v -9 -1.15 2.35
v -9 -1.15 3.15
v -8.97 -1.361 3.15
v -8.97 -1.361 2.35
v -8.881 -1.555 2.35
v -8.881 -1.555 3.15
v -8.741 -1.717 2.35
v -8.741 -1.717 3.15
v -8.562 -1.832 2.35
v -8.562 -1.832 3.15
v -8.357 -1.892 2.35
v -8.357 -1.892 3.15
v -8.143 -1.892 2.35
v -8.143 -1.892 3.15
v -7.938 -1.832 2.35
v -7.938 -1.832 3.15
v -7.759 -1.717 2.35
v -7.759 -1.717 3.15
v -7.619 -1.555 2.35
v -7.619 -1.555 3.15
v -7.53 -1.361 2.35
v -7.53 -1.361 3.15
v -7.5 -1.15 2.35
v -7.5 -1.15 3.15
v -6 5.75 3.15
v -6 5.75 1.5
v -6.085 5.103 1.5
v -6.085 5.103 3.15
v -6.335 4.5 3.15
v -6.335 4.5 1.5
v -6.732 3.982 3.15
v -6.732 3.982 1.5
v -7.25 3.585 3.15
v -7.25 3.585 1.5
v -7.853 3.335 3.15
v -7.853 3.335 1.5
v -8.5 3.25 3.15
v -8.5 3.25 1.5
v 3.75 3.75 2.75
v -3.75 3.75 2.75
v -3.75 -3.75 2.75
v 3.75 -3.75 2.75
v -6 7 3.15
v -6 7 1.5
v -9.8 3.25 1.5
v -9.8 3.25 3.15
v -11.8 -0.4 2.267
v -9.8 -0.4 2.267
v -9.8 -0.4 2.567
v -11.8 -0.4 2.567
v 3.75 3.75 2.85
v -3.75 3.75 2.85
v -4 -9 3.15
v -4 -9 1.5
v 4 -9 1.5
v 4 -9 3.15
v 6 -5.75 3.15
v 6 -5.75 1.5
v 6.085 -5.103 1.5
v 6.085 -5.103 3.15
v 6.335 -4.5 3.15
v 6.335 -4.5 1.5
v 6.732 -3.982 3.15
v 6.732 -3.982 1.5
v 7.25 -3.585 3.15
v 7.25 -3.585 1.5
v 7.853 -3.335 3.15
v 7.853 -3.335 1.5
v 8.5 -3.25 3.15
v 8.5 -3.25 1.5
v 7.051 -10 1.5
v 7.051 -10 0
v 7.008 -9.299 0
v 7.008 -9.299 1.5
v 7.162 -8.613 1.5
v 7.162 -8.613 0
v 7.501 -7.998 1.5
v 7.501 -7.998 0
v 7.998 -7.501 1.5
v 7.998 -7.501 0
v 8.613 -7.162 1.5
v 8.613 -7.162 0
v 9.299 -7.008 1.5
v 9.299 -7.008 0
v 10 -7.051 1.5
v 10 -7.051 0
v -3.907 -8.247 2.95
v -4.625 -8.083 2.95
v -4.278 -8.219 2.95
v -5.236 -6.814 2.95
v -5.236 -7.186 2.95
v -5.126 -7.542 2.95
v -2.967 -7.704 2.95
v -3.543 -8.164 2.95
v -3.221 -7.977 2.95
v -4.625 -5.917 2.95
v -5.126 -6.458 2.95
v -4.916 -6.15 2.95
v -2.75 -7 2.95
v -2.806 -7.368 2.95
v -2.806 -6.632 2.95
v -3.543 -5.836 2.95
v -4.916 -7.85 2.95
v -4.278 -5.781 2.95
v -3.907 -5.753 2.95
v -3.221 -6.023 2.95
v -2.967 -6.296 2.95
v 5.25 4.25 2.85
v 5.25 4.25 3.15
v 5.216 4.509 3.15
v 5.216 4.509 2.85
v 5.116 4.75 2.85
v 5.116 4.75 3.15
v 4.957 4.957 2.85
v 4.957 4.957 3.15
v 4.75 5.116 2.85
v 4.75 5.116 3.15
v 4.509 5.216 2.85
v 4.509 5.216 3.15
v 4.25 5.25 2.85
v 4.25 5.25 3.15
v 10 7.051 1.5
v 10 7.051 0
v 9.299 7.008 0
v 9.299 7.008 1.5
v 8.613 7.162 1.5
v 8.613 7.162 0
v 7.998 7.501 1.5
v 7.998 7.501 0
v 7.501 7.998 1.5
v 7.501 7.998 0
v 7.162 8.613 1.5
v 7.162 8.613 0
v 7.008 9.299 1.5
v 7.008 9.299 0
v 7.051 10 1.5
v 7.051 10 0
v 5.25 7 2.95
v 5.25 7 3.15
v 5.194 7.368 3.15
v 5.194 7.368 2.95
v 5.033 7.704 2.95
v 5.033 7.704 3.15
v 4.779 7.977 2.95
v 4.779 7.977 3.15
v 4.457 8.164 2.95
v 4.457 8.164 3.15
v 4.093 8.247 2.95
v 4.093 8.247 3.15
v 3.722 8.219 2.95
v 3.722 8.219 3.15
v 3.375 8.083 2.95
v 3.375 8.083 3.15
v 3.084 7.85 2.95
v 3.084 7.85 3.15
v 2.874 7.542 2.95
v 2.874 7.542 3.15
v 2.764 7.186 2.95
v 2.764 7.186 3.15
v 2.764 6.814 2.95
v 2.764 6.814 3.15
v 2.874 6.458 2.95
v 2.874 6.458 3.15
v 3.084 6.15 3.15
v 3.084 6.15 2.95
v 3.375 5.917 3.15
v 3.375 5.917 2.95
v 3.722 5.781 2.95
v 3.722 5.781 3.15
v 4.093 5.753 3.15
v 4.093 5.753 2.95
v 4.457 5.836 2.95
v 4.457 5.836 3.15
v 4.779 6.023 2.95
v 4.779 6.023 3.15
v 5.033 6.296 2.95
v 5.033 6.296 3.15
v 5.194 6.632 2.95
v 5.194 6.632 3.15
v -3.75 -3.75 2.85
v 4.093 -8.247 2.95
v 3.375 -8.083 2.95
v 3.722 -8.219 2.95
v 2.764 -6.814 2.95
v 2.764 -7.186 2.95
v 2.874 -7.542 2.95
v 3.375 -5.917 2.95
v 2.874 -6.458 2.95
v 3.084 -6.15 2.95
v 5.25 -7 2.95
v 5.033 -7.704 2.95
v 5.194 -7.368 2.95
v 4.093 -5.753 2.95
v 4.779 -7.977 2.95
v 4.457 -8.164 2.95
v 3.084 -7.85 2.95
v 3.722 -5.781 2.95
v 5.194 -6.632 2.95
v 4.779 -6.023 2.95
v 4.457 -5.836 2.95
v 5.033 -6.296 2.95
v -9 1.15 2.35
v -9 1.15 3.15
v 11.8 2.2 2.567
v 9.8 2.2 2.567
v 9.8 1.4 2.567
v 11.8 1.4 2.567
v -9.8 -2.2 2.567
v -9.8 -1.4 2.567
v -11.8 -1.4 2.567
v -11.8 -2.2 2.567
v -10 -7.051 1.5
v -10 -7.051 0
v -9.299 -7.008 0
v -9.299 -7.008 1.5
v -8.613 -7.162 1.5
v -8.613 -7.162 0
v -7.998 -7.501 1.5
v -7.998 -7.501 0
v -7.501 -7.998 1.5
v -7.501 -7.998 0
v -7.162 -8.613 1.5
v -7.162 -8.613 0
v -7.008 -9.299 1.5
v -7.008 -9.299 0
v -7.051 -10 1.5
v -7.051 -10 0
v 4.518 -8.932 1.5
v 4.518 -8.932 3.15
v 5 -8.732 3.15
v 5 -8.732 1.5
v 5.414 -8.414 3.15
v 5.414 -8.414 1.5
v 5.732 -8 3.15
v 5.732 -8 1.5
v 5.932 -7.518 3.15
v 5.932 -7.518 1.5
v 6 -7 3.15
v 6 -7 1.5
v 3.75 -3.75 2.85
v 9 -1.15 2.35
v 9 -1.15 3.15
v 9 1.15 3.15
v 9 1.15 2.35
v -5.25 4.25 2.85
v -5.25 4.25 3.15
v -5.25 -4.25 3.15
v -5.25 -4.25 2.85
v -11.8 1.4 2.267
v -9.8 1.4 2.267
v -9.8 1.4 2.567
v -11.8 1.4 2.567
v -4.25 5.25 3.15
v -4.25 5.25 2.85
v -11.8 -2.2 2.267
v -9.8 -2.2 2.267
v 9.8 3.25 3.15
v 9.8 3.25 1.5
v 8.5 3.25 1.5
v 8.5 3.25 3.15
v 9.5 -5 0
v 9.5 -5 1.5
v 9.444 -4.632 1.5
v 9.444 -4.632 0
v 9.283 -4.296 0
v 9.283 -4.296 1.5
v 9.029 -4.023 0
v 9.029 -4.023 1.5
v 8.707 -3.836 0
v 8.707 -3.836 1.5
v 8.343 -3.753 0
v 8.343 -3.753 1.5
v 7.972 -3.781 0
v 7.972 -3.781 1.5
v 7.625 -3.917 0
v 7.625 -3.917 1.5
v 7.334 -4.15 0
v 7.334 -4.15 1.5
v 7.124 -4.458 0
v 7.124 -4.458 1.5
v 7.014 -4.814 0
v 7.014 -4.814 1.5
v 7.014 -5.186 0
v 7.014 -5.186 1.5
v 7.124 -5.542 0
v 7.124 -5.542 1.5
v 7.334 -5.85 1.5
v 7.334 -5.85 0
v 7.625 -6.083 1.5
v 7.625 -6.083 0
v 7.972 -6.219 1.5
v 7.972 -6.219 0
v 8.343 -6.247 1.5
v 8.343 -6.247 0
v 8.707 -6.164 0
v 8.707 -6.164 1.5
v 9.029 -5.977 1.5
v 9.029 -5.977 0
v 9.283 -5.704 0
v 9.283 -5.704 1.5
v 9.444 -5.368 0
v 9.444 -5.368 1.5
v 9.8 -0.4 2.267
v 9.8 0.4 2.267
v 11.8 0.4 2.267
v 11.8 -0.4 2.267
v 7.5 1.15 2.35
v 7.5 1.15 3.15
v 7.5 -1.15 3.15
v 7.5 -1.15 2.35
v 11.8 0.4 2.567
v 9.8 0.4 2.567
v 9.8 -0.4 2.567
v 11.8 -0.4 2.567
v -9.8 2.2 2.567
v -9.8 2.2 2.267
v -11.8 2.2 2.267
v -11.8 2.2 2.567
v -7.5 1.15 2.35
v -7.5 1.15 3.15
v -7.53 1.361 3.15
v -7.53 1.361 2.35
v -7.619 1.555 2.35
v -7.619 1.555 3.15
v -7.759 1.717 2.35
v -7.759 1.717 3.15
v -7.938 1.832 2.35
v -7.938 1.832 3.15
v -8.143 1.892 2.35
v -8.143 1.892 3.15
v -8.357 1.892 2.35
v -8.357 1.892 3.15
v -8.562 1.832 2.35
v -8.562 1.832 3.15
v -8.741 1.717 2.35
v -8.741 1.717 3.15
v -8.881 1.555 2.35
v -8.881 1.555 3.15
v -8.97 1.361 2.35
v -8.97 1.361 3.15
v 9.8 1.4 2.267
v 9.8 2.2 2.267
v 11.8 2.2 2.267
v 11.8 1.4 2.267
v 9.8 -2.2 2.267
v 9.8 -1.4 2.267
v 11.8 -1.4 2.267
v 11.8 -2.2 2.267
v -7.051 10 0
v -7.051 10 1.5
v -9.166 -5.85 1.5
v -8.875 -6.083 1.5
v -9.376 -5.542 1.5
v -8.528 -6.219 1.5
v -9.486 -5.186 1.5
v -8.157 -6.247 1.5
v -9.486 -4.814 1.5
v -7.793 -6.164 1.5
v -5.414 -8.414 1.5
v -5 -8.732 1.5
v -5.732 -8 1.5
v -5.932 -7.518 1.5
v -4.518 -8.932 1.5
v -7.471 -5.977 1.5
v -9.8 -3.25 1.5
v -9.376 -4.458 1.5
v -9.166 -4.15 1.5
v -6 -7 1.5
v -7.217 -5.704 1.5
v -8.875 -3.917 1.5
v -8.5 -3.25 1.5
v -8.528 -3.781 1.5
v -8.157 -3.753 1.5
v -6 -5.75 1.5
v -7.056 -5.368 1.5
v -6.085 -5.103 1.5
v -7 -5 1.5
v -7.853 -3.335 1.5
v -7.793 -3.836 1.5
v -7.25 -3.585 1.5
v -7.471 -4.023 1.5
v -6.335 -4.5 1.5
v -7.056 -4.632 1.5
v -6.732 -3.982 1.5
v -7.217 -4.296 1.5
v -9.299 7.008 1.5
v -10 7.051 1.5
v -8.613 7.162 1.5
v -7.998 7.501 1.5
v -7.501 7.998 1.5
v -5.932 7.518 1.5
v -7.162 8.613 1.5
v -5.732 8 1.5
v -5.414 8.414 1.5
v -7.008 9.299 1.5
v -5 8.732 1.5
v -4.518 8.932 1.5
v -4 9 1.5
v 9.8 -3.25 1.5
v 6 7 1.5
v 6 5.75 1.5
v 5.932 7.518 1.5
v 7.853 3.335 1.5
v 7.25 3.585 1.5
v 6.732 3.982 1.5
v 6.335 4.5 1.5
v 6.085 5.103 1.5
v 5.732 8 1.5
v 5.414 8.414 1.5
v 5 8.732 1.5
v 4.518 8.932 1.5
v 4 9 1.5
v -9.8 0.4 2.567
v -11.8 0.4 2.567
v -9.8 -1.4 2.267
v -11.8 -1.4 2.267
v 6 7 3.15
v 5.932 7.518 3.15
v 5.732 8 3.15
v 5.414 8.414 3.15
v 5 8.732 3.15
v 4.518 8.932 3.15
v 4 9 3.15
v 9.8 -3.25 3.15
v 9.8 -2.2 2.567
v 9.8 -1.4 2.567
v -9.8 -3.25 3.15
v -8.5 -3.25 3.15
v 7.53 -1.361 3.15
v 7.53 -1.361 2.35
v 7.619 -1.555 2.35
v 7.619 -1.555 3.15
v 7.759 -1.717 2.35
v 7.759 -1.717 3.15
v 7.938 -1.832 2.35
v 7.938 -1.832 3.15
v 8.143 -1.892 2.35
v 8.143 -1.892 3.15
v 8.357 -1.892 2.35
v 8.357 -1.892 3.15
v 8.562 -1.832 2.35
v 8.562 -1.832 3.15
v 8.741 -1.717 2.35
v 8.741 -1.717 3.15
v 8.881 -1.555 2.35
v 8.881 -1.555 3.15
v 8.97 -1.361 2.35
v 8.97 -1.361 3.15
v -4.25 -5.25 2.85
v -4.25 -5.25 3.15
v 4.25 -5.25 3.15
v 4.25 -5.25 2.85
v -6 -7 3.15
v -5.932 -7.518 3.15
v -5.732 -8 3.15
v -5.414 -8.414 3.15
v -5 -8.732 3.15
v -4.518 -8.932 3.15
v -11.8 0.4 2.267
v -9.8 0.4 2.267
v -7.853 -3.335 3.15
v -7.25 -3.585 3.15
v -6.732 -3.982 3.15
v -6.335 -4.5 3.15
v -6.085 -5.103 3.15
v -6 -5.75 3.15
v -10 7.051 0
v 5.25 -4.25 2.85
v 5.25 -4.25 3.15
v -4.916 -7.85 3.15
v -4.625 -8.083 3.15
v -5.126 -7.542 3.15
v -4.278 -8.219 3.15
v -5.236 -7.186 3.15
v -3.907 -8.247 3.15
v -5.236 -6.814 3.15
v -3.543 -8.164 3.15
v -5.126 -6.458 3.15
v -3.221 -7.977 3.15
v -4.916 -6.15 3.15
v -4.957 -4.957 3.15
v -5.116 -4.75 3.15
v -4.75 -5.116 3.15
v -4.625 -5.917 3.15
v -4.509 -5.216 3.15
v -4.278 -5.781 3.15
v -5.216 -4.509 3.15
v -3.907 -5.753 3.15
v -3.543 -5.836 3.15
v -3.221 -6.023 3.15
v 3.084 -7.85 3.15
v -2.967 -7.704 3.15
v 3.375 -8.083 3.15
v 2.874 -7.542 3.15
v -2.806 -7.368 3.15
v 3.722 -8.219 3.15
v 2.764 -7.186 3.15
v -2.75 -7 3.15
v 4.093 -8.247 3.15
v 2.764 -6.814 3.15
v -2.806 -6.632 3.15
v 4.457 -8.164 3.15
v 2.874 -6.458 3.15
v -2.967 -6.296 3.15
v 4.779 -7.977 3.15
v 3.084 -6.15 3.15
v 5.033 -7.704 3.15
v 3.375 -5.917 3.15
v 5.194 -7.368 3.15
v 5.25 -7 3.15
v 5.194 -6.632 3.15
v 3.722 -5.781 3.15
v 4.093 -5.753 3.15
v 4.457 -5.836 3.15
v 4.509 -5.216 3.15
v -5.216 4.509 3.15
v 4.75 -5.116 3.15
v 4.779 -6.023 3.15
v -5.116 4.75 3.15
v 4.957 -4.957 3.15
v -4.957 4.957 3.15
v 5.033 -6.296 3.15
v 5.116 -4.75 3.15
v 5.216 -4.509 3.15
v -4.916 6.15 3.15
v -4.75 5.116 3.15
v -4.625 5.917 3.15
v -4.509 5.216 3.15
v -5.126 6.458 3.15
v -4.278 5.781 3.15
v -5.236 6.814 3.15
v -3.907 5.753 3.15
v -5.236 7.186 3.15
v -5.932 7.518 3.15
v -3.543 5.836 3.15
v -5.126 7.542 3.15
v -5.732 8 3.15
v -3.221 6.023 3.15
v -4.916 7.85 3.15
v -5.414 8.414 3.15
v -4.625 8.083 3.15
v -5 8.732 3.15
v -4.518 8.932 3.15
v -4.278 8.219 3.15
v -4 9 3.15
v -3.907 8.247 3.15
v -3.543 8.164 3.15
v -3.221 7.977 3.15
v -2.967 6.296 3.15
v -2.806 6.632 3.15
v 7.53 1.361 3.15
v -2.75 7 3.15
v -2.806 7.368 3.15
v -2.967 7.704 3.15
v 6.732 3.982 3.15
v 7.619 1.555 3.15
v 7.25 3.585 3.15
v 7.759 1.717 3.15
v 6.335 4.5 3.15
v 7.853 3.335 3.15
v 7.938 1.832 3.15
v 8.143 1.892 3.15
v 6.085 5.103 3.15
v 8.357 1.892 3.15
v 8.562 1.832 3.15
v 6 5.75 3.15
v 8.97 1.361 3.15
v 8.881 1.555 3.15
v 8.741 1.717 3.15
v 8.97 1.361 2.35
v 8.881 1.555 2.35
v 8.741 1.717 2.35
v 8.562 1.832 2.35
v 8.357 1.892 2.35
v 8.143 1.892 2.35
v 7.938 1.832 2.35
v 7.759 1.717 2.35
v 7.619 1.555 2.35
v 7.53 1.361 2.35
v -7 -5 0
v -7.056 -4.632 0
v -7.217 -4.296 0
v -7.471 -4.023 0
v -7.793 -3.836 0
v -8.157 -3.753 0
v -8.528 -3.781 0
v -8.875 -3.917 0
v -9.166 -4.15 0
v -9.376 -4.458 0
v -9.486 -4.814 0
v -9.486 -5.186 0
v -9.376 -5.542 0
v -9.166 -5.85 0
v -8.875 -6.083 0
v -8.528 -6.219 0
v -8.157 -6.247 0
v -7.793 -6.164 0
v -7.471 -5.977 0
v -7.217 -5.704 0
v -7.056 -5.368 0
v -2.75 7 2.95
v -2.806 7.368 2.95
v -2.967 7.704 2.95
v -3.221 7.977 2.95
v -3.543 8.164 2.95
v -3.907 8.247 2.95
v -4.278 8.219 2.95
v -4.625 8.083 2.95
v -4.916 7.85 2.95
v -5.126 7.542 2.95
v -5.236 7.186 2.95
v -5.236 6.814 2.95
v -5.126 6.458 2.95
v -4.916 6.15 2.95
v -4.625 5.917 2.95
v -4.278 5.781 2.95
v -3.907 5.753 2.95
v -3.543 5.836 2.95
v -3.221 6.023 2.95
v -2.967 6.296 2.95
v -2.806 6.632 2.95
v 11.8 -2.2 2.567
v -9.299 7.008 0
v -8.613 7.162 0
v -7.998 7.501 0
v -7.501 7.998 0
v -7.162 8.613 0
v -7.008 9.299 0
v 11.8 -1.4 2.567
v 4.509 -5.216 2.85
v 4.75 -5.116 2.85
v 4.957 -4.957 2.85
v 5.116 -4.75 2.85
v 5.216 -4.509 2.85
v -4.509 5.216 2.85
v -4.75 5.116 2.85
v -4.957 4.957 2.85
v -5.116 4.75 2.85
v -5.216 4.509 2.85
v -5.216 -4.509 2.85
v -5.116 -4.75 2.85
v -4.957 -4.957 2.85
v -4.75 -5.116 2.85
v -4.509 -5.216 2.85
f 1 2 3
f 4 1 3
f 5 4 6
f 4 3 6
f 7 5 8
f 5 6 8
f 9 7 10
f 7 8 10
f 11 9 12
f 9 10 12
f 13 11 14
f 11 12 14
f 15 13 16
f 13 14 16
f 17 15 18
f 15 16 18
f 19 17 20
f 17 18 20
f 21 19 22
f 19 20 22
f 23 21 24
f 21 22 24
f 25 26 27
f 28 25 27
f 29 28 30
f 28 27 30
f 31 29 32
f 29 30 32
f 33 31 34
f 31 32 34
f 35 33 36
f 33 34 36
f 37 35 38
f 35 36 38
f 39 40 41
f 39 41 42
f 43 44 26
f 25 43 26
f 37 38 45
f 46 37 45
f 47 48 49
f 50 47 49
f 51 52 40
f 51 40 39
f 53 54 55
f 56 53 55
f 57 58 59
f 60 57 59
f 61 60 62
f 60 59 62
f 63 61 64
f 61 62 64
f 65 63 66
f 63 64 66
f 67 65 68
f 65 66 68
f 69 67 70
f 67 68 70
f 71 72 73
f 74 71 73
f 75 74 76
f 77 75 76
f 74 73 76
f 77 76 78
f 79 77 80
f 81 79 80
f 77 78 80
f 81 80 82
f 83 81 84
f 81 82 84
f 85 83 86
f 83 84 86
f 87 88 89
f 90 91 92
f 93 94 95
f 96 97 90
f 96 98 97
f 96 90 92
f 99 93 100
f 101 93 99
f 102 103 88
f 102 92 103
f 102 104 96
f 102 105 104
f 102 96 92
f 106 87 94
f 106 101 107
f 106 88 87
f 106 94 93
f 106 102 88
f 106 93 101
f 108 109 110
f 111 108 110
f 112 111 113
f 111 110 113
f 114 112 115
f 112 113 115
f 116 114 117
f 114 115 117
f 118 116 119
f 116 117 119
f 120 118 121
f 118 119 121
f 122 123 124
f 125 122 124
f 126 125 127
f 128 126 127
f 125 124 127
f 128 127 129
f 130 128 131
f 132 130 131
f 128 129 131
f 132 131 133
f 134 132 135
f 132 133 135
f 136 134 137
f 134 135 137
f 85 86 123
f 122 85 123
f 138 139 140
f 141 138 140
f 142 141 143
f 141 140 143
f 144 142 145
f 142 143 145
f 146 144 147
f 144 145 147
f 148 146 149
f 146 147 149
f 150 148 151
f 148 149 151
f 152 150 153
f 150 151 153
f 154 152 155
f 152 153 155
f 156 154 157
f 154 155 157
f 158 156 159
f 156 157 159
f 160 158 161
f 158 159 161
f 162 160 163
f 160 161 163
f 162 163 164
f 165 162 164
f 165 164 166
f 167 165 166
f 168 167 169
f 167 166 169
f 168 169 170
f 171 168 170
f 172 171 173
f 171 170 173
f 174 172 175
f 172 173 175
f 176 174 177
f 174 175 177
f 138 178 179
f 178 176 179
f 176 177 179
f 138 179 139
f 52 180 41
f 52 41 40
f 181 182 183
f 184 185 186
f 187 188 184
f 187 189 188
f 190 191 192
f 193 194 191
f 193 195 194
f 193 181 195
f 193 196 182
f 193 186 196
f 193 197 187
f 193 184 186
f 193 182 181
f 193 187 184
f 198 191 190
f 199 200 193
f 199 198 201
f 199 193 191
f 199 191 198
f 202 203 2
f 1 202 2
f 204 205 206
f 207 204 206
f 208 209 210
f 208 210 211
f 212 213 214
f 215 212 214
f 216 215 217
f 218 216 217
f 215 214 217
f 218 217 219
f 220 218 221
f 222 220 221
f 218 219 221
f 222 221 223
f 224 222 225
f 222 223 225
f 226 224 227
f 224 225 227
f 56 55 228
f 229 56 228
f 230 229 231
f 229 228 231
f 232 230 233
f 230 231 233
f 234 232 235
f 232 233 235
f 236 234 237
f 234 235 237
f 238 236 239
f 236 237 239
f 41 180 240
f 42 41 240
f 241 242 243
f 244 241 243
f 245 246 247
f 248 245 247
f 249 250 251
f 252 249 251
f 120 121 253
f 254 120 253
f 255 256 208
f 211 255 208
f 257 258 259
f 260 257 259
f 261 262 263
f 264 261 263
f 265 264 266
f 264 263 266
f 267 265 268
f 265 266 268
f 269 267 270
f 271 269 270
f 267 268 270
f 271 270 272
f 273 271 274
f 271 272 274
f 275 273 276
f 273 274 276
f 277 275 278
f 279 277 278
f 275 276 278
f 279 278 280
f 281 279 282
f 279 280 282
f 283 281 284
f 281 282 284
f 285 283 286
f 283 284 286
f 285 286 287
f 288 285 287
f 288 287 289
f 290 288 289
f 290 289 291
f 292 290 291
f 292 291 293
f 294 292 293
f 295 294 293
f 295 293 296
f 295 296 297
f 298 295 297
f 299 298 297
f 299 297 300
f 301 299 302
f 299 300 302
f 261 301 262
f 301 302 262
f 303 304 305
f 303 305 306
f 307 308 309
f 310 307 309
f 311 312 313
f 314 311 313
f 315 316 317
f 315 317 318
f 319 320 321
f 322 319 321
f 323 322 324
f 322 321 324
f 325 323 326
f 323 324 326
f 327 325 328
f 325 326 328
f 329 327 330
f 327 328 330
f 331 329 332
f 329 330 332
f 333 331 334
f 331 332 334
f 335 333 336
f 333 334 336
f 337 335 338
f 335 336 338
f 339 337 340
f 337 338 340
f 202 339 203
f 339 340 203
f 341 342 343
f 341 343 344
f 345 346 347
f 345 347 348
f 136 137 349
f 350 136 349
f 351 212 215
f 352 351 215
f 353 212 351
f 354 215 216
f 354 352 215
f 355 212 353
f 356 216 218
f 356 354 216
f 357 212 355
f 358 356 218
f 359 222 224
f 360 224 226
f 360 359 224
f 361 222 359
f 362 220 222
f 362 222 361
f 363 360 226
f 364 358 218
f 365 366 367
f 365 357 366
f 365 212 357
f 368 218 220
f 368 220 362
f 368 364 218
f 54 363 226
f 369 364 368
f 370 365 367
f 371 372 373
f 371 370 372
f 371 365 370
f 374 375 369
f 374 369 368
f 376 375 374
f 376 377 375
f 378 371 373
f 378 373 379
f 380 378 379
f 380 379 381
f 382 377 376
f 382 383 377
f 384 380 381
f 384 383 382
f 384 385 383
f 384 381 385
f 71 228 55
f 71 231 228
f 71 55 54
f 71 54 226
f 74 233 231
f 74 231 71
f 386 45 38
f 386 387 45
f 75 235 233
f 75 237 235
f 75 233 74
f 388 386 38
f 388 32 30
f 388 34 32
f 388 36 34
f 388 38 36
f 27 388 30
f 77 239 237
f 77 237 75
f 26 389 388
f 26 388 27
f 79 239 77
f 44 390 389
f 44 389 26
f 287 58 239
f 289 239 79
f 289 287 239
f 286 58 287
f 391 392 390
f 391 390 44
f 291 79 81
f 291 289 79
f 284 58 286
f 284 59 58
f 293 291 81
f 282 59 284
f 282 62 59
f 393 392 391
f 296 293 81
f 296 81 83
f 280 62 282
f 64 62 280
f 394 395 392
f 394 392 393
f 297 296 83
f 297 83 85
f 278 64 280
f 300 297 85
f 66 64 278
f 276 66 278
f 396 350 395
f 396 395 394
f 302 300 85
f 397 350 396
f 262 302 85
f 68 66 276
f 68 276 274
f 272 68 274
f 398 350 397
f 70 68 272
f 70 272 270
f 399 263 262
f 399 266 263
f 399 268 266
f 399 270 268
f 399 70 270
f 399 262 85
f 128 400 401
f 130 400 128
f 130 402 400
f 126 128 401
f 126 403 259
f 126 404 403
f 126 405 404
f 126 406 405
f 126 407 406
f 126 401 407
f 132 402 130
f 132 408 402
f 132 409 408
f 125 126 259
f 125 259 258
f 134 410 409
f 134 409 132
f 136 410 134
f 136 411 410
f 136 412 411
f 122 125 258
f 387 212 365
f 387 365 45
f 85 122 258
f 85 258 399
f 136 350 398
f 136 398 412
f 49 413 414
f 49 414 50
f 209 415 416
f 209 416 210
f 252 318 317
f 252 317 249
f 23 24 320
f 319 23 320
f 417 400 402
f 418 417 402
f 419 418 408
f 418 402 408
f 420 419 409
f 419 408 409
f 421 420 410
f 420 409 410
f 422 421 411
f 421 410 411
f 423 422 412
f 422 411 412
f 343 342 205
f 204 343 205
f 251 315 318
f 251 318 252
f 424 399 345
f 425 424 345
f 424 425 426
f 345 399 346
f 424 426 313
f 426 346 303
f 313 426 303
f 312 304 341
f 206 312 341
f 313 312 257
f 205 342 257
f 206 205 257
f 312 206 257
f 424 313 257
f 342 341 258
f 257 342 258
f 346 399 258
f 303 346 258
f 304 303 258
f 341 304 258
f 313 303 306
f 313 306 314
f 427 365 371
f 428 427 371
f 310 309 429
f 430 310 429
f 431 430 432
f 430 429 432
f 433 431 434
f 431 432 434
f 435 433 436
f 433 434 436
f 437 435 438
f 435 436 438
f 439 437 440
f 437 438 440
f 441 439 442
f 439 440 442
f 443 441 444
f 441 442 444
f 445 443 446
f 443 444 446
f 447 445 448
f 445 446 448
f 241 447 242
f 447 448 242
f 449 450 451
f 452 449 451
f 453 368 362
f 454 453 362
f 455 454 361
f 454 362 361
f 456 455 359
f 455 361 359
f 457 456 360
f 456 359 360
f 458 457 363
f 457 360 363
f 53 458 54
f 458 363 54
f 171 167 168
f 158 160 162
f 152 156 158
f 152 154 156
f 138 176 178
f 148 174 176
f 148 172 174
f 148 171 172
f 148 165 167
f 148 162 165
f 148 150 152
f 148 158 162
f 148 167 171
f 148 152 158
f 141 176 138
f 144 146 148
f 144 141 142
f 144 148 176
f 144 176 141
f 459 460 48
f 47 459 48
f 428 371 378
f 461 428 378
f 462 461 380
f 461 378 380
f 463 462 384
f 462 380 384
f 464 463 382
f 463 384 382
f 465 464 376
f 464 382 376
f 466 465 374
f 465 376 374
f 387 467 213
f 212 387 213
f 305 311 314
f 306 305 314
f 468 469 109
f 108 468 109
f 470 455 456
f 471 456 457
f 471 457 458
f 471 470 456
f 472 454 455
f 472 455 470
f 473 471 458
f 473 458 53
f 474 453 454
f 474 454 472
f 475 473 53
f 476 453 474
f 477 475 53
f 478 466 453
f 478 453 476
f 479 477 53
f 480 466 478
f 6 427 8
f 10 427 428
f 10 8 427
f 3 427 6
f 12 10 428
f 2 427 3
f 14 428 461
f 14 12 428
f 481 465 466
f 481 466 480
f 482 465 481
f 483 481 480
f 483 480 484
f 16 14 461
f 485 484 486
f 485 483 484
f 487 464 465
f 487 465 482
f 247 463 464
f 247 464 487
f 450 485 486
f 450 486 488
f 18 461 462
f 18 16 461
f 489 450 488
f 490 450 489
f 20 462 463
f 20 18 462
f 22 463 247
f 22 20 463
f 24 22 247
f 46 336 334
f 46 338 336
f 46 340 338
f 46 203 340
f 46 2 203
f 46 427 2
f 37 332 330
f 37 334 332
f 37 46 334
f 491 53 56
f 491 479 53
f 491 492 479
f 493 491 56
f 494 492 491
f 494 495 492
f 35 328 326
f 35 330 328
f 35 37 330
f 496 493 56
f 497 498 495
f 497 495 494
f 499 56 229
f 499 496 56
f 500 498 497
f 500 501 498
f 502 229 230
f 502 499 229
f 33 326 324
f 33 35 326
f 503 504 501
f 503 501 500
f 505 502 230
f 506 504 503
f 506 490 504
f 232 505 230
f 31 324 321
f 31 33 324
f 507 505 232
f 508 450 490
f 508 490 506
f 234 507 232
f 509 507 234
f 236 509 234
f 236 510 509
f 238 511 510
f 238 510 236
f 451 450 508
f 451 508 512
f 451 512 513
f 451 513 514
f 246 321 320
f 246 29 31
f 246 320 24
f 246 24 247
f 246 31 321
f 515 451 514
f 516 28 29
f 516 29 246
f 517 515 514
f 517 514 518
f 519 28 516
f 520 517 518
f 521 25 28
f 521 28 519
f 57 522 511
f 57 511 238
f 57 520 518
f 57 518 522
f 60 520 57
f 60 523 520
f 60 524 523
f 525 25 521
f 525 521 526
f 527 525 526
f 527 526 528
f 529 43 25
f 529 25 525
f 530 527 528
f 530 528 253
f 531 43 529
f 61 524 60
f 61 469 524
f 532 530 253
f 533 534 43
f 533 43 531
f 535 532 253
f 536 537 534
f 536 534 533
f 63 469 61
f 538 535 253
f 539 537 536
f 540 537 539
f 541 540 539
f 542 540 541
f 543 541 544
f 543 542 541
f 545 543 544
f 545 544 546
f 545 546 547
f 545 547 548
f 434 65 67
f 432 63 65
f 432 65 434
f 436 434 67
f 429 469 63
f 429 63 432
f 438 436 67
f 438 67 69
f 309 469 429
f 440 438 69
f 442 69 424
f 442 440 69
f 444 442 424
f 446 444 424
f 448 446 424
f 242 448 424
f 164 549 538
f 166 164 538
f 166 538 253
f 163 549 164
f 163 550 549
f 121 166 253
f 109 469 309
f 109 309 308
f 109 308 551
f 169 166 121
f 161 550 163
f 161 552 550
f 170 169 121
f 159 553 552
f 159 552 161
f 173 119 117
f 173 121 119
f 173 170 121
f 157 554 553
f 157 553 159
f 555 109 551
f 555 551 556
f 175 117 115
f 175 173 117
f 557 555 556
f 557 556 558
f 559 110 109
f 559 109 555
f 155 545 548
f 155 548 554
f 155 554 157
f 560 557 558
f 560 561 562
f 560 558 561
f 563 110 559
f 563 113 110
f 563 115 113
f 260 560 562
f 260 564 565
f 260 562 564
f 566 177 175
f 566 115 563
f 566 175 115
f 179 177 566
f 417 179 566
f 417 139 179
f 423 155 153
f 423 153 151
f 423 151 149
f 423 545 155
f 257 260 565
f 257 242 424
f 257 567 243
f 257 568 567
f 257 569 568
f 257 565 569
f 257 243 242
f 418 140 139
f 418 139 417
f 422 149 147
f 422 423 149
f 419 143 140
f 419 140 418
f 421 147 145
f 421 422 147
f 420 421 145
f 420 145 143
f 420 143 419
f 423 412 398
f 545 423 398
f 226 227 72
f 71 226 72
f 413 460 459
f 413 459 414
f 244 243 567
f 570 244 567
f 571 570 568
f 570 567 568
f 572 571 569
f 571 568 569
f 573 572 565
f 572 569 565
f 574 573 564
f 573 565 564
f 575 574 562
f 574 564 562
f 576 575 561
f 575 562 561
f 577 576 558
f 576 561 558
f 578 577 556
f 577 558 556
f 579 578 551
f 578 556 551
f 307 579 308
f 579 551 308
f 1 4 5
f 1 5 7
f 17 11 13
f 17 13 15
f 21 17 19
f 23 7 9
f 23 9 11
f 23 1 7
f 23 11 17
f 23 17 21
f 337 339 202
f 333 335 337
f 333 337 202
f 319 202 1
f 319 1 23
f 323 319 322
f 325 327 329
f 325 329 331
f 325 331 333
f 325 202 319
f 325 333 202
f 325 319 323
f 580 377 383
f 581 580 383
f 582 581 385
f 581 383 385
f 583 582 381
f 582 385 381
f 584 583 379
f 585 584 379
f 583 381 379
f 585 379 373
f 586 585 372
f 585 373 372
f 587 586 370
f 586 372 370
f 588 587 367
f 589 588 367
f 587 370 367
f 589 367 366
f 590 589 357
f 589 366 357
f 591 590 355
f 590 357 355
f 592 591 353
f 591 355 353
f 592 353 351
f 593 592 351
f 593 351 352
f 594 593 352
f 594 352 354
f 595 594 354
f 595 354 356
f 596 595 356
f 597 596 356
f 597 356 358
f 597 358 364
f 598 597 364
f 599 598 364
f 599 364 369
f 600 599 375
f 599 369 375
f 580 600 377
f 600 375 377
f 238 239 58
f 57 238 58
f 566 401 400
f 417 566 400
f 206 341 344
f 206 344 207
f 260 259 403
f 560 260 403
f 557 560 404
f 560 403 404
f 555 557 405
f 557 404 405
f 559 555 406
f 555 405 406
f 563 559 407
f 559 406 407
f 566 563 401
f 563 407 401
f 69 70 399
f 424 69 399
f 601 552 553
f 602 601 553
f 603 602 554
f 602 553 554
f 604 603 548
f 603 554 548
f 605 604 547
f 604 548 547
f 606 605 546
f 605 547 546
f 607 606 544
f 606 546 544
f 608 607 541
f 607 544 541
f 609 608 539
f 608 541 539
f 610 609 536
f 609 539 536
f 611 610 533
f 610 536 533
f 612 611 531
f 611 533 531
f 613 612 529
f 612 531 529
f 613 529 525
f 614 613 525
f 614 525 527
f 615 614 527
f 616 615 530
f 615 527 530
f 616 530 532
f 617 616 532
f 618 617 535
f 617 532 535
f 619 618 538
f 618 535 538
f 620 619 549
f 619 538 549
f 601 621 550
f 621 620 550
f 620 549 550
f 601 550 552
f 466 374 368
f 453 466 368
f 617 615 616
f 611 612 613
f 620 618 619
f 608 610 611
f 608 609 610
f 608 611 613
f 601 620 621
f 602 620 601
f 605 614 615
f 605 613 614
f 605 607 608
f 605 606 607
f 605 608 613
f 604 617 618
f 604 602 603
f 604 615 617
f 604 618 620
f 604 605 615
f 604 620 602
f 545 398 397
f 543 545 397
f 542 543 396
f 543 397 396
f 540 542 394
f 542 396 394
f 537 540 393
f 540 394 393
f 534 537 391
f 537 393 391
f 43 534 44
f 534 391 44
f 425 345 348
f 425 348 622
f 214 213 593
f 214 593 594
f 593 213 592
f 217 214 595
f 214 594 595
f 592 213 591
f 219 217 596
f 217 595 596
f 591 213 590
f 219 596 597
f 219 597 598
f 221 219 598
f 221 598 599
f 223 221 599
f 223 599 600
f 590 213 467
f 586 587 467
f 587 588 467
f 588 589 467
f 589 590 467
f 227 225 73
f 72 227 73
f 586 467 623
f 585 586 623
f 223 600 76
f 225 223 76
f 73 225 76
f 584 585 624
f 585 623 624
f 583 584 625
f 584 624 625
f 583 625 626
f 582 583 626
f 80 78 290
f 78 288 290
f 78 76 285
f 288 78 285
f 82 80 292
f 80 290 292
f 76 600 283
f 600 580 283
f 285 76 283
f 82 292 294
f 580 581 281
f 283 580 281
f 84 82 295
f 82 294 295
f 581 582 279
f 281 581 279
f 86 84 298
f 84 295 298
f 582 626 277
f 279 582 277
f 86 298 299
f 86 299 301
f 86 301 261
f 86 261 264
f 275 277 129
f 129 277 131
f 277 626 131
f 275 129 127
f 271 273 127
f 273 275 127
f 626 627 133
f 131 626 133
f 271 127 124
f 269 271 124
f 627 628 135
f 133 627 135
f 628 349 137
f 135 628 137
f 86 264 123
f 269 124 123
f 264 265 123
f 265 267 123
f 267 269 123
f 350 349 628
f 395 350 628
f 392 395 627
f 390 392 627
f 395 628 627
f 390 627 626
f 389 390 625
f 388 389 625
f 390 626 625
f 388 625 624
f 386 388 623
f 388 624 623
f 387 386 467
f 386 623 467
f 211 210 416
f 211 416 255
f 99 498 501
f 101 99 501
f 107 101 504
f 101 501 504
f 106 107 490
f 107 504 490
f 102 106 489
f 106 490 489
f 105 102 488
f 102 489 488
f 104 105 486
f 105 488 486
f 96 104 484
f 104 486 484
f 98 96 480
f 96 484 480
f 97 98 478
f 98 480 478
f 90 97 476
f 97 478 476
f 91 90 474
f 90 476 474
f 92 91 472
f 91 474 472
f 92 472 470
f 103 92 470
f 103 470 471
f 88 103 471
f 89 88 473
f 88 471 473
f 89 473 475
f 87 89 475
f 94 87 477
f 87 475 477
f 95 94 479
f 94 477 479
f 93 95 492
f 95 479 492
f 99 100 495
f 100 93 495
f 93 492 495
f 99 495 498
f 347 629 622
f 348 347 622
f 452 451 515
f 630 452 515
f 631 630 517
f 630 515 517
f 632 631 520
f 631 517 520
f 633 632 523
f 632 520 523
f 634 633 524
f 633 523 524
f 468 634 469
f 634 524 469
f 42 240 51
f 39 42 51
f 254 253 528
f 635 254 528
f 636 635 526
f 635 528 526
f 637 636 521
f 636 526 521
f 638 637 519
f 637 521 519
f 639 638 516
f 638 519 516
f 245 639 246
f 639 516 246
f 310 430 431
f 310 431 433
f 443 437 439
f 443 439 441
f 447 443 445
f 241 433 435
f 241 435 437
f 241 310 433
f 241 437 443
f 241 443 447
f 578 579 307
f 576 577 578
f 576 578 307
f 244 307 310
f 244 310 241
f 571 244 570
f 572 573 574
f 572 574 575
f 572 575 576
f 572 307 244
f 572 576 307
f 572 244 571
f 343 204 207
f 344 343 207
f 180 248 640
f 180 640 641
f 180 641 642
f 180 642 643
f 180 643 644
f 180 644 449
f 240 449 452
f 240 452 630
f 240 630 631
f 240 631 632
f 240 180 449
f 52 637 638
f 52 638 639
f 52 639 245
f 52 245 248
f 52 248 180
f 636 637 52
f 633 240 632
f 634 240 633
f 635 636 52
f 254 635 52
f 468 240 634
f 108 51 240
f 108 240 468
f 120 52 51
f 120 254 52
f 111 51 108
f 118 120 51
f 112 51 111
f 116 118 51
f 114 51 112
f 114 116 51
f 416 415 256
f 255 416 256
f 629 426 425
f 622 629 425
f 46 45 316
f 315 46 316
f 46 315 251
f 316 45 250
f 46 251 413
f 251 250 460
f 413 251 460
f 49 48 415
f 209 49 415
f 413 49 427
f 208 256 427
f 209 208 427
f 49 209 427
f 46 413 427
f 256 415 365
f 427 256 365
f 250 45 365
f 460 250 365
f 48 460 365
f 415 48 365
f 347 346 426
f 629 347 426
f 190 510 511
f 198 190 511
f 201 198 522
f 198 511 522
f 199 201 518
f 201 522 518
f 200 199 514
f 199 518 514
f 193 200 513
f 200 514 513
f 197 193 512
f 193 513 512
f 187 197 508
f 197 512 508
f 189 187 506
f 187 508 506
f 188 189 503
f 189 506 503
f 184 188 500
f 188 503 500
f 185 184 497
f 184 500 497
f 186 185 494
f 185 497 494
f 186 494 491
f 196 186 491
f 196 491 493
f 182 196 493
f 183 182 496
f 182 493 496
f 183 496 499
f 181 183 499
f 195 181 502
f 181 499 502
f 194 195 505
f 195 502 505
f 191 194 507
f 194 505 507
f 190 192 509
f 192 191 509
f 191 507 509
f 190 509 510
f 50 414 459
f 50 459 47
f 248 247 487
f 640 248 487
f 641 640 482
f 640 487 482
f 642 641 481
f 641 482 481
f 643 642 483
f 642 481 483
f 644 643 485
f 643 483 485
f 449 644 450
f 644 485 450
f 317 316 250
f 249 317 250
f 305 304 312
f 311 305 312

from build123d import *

# Parameters (mm, degrees)
F1_DEPTH  = 1.5
F3_DEPTH  = 1.65
F5_DEPTH  = 0.3
F6_R      = 1.25
F7_DEPTH  = 0.2
F8_W      = 0.8
F8_H      = 0.3
F9_DEPTH  = 2
F11_R     = 1.25
F12_DEPTH = 1.5
F14_DEPTH = 0.8
F15_W     = 7.5
F15_H     = 7.5
F16_DEPTH = 0.1


with BuildPart() as f1:
    # F0 (on Top) → F1 (new body)
    with BuildSketch(Plane.XY):
        with BuildLine():
            ThreePointArc((-7.0505102572, 10), (-7.732233047, 7.732233047), (-10, 7.0505102572))
            Line((-10, 7.0505102572), (-10, -7.0505102572))
            ThreePointArc((-10, -7.0505102572), (-7.732233047, -7.732233047), (-7.0505102572, -10))
            Line((-7.0505102572, -10), (7.0505102572, -10))
            ThreePointArc((7.0505102572, -10), (7.732233047, -7.732233047), (10, -7.0505102572))
            Line((10, -7.0505102572), (10, 7.0505102572))
            ThreePointArc((10, 7.0505102572), (7.732233047, 7.732233047), (7.0505102572, 10))
            Line((7.0505102572, 10), (-7.0505102572, 10))
        make_face()
    extrude(amount=F1_DEPTH)

    # F2 (on face) → F3 (join)
    with BuildSketch(Plane.XY.offset(1.5)):
        with BuildLine():
            Line((-6, 7), (-6, 5.75))
            ThreePointArc((-6, 5.75), (-6.732233047, 3.982233047), (-8.5, 3.25))
            Line((-8.5, 3.25), (-9.8, 3.25))
            Line((-9.8, 3.25), (-9.8, -3.25))
            Line((-9.8, -3.25), (-8.5, -3.25))
            ThreePointArc((-8.5, -3.25), (-6.732233047, -3.982233047), (-6, -5.75))
            Line((-6, -5.75), (-6, -7))
            ThreePointArc((-6, -7), (-5.4142135624, -8.4142135624), (-4, -9))
            Line((-4, -9), (4, -9))
            ThreePointArc((4, -9), (5.4142135624, -8.4142135624), (6, -7))
            Line((6, -7), (6, -5.75))
            ThreePointArc((6, -5.75), (6.732233047, -3.982233047), (8.5, -3.25))
            Line((8.5, -3.25), (9.8, -3.25))
            Line((9.8, -3.25), (9.8, 3.25))
            Line((9.8, 3.25), (8.5, 3.25))
            ThreePointArc((8.5, 3.25), (6.732233047, 3.982233047), (6, 5.75))
            Line((6, 5.75), (6, 7))
            ThreePointArc((6, 7), (5.4142135624, 8.4142135624), (4, 9))
            Line((4, 9), (-4, 9))
            ThreePointArc((-4, 9), (-5.4142135624, 8.4142135624), (-6, 7))
        make_face()
    extrude(amount=F3_DEPTH)

    # F4 (on face) → F5 (cut)
    with BuildSketch(Plane.XY.offset(3.15)):
        with BuildLine():
            Line((4.25, 5.25), (-4.25, 5.25))
            ThreePointArc((-4.25, 5.25), (-4.9571067812, 4.9571067812), (-5.25, 4.25))
            Line((-5.25, 4.25), (-5.25, -4.25))
            ThreePointArc((-5.25, -4.25), (-4.9571067812, -4.9571067812), (-4.25, -5.25))
            Line((-4.25, -5.25), (4.25, -5.25))
            ThreePointArc((4.25, -5.25), (4.9571067812, -4.9571067812), (5.25, -4.25))
            Line((5.25, -4.25), (5.25, 4.25))
            ThreePointArc((5.25, 4.25), (4.9571067812, 4.9571067812), (4.25, 5.25))
        make_face()
    extrude(amount=-F5_DEPTH, mode=Mode.SUBTRACT)

    # F6 (on face) → F7 (cut)
    with BuildSketch(Plane.XY.offset(3.15)):
        with Locations((-4, 7)):
            Circle(F6_R)
        with Locations((4, 7)):
            Circle(F6_R)
        with Locations((-4, -7)):
            Circle(F6_R)
        with Locations((4, -7)):
            Circle(F6_R)
    extrude(amount=-F7_DEPTH, mode=Mode.SUBTRACT)

    # F8 (on face) → F9 (join)
    with BuildSketch(Plane(origin=(-9.8, 0, 0), x_dir=(0, -1, 0), z_dir=(-1, 0, 0))):
        with Locations((0, 2.4165040218)):
            Rectangle(F8_W, F8_H)
        with Locations((1.8, 2.4165040218)):
            Rectangle(F8_W, F8_H)
        with Locations((-1.8, 2.4165040218)):
            Rectangle(F8_W, F8_H)
    extrude(amount=F9_DEPTH)

    # F10: F1 across plane


with BuildPart() as f1_1:
    add(f1.part)
    add(f1.part.mirror(Plane.YZ))

    # F11 (on face) → F12 (cut, through all)
    with BuildSketch(Plane.XY.offset(1.5)):
        with Locations((-8.25, -5)):
            Circle(F11_R)
        with Locations((8.25, -5)):
            Circle(F11_R)
    extrude(amount=-F12_DEPTH, mode=Mode.SUBTRACT)

    # F13 (on face) → F14 (cut)
    with BuildSketch(Plane.XY.offset(3.15)):
        with BuildLine():
            ThreePointArc((-7.5, 1.15), (-8.25, 1.9), (-9, 1.15))
            Line((-9, 1.15), (-9, -1.15))
            ThreePointArc((-9, -1.15), (-8.25, -1.9), (-7.5, -1.15))
            Line((-7.5, -1.15), (-7.5, 1.15))
        make_face()
        with BuildLine():
            ThreePointArc((7.5, -1.15), (8.25, -1.9), (9, -1.15))
            Line((9, -1.15), (9, 1.15))
            ThreePointArc((9, 1.15), (8.25, 1.9), (7.5, 1.15))
            Line((7.5, 1.15), (7.5, -1.15))
        make_face()
    extrude(amount=-F14_DEPTH, mode=Mode.SUBTRACT)

    # F15 (on face) → F16 (cut)
    with BuildSketch(Plane.XY.offset(2.85)):
        Rectangle(F15_W, F15_H)
    extrude(amount=-F16_DEPTH, mode=Mode.SUBTRACT)


solid = f1_1.part
